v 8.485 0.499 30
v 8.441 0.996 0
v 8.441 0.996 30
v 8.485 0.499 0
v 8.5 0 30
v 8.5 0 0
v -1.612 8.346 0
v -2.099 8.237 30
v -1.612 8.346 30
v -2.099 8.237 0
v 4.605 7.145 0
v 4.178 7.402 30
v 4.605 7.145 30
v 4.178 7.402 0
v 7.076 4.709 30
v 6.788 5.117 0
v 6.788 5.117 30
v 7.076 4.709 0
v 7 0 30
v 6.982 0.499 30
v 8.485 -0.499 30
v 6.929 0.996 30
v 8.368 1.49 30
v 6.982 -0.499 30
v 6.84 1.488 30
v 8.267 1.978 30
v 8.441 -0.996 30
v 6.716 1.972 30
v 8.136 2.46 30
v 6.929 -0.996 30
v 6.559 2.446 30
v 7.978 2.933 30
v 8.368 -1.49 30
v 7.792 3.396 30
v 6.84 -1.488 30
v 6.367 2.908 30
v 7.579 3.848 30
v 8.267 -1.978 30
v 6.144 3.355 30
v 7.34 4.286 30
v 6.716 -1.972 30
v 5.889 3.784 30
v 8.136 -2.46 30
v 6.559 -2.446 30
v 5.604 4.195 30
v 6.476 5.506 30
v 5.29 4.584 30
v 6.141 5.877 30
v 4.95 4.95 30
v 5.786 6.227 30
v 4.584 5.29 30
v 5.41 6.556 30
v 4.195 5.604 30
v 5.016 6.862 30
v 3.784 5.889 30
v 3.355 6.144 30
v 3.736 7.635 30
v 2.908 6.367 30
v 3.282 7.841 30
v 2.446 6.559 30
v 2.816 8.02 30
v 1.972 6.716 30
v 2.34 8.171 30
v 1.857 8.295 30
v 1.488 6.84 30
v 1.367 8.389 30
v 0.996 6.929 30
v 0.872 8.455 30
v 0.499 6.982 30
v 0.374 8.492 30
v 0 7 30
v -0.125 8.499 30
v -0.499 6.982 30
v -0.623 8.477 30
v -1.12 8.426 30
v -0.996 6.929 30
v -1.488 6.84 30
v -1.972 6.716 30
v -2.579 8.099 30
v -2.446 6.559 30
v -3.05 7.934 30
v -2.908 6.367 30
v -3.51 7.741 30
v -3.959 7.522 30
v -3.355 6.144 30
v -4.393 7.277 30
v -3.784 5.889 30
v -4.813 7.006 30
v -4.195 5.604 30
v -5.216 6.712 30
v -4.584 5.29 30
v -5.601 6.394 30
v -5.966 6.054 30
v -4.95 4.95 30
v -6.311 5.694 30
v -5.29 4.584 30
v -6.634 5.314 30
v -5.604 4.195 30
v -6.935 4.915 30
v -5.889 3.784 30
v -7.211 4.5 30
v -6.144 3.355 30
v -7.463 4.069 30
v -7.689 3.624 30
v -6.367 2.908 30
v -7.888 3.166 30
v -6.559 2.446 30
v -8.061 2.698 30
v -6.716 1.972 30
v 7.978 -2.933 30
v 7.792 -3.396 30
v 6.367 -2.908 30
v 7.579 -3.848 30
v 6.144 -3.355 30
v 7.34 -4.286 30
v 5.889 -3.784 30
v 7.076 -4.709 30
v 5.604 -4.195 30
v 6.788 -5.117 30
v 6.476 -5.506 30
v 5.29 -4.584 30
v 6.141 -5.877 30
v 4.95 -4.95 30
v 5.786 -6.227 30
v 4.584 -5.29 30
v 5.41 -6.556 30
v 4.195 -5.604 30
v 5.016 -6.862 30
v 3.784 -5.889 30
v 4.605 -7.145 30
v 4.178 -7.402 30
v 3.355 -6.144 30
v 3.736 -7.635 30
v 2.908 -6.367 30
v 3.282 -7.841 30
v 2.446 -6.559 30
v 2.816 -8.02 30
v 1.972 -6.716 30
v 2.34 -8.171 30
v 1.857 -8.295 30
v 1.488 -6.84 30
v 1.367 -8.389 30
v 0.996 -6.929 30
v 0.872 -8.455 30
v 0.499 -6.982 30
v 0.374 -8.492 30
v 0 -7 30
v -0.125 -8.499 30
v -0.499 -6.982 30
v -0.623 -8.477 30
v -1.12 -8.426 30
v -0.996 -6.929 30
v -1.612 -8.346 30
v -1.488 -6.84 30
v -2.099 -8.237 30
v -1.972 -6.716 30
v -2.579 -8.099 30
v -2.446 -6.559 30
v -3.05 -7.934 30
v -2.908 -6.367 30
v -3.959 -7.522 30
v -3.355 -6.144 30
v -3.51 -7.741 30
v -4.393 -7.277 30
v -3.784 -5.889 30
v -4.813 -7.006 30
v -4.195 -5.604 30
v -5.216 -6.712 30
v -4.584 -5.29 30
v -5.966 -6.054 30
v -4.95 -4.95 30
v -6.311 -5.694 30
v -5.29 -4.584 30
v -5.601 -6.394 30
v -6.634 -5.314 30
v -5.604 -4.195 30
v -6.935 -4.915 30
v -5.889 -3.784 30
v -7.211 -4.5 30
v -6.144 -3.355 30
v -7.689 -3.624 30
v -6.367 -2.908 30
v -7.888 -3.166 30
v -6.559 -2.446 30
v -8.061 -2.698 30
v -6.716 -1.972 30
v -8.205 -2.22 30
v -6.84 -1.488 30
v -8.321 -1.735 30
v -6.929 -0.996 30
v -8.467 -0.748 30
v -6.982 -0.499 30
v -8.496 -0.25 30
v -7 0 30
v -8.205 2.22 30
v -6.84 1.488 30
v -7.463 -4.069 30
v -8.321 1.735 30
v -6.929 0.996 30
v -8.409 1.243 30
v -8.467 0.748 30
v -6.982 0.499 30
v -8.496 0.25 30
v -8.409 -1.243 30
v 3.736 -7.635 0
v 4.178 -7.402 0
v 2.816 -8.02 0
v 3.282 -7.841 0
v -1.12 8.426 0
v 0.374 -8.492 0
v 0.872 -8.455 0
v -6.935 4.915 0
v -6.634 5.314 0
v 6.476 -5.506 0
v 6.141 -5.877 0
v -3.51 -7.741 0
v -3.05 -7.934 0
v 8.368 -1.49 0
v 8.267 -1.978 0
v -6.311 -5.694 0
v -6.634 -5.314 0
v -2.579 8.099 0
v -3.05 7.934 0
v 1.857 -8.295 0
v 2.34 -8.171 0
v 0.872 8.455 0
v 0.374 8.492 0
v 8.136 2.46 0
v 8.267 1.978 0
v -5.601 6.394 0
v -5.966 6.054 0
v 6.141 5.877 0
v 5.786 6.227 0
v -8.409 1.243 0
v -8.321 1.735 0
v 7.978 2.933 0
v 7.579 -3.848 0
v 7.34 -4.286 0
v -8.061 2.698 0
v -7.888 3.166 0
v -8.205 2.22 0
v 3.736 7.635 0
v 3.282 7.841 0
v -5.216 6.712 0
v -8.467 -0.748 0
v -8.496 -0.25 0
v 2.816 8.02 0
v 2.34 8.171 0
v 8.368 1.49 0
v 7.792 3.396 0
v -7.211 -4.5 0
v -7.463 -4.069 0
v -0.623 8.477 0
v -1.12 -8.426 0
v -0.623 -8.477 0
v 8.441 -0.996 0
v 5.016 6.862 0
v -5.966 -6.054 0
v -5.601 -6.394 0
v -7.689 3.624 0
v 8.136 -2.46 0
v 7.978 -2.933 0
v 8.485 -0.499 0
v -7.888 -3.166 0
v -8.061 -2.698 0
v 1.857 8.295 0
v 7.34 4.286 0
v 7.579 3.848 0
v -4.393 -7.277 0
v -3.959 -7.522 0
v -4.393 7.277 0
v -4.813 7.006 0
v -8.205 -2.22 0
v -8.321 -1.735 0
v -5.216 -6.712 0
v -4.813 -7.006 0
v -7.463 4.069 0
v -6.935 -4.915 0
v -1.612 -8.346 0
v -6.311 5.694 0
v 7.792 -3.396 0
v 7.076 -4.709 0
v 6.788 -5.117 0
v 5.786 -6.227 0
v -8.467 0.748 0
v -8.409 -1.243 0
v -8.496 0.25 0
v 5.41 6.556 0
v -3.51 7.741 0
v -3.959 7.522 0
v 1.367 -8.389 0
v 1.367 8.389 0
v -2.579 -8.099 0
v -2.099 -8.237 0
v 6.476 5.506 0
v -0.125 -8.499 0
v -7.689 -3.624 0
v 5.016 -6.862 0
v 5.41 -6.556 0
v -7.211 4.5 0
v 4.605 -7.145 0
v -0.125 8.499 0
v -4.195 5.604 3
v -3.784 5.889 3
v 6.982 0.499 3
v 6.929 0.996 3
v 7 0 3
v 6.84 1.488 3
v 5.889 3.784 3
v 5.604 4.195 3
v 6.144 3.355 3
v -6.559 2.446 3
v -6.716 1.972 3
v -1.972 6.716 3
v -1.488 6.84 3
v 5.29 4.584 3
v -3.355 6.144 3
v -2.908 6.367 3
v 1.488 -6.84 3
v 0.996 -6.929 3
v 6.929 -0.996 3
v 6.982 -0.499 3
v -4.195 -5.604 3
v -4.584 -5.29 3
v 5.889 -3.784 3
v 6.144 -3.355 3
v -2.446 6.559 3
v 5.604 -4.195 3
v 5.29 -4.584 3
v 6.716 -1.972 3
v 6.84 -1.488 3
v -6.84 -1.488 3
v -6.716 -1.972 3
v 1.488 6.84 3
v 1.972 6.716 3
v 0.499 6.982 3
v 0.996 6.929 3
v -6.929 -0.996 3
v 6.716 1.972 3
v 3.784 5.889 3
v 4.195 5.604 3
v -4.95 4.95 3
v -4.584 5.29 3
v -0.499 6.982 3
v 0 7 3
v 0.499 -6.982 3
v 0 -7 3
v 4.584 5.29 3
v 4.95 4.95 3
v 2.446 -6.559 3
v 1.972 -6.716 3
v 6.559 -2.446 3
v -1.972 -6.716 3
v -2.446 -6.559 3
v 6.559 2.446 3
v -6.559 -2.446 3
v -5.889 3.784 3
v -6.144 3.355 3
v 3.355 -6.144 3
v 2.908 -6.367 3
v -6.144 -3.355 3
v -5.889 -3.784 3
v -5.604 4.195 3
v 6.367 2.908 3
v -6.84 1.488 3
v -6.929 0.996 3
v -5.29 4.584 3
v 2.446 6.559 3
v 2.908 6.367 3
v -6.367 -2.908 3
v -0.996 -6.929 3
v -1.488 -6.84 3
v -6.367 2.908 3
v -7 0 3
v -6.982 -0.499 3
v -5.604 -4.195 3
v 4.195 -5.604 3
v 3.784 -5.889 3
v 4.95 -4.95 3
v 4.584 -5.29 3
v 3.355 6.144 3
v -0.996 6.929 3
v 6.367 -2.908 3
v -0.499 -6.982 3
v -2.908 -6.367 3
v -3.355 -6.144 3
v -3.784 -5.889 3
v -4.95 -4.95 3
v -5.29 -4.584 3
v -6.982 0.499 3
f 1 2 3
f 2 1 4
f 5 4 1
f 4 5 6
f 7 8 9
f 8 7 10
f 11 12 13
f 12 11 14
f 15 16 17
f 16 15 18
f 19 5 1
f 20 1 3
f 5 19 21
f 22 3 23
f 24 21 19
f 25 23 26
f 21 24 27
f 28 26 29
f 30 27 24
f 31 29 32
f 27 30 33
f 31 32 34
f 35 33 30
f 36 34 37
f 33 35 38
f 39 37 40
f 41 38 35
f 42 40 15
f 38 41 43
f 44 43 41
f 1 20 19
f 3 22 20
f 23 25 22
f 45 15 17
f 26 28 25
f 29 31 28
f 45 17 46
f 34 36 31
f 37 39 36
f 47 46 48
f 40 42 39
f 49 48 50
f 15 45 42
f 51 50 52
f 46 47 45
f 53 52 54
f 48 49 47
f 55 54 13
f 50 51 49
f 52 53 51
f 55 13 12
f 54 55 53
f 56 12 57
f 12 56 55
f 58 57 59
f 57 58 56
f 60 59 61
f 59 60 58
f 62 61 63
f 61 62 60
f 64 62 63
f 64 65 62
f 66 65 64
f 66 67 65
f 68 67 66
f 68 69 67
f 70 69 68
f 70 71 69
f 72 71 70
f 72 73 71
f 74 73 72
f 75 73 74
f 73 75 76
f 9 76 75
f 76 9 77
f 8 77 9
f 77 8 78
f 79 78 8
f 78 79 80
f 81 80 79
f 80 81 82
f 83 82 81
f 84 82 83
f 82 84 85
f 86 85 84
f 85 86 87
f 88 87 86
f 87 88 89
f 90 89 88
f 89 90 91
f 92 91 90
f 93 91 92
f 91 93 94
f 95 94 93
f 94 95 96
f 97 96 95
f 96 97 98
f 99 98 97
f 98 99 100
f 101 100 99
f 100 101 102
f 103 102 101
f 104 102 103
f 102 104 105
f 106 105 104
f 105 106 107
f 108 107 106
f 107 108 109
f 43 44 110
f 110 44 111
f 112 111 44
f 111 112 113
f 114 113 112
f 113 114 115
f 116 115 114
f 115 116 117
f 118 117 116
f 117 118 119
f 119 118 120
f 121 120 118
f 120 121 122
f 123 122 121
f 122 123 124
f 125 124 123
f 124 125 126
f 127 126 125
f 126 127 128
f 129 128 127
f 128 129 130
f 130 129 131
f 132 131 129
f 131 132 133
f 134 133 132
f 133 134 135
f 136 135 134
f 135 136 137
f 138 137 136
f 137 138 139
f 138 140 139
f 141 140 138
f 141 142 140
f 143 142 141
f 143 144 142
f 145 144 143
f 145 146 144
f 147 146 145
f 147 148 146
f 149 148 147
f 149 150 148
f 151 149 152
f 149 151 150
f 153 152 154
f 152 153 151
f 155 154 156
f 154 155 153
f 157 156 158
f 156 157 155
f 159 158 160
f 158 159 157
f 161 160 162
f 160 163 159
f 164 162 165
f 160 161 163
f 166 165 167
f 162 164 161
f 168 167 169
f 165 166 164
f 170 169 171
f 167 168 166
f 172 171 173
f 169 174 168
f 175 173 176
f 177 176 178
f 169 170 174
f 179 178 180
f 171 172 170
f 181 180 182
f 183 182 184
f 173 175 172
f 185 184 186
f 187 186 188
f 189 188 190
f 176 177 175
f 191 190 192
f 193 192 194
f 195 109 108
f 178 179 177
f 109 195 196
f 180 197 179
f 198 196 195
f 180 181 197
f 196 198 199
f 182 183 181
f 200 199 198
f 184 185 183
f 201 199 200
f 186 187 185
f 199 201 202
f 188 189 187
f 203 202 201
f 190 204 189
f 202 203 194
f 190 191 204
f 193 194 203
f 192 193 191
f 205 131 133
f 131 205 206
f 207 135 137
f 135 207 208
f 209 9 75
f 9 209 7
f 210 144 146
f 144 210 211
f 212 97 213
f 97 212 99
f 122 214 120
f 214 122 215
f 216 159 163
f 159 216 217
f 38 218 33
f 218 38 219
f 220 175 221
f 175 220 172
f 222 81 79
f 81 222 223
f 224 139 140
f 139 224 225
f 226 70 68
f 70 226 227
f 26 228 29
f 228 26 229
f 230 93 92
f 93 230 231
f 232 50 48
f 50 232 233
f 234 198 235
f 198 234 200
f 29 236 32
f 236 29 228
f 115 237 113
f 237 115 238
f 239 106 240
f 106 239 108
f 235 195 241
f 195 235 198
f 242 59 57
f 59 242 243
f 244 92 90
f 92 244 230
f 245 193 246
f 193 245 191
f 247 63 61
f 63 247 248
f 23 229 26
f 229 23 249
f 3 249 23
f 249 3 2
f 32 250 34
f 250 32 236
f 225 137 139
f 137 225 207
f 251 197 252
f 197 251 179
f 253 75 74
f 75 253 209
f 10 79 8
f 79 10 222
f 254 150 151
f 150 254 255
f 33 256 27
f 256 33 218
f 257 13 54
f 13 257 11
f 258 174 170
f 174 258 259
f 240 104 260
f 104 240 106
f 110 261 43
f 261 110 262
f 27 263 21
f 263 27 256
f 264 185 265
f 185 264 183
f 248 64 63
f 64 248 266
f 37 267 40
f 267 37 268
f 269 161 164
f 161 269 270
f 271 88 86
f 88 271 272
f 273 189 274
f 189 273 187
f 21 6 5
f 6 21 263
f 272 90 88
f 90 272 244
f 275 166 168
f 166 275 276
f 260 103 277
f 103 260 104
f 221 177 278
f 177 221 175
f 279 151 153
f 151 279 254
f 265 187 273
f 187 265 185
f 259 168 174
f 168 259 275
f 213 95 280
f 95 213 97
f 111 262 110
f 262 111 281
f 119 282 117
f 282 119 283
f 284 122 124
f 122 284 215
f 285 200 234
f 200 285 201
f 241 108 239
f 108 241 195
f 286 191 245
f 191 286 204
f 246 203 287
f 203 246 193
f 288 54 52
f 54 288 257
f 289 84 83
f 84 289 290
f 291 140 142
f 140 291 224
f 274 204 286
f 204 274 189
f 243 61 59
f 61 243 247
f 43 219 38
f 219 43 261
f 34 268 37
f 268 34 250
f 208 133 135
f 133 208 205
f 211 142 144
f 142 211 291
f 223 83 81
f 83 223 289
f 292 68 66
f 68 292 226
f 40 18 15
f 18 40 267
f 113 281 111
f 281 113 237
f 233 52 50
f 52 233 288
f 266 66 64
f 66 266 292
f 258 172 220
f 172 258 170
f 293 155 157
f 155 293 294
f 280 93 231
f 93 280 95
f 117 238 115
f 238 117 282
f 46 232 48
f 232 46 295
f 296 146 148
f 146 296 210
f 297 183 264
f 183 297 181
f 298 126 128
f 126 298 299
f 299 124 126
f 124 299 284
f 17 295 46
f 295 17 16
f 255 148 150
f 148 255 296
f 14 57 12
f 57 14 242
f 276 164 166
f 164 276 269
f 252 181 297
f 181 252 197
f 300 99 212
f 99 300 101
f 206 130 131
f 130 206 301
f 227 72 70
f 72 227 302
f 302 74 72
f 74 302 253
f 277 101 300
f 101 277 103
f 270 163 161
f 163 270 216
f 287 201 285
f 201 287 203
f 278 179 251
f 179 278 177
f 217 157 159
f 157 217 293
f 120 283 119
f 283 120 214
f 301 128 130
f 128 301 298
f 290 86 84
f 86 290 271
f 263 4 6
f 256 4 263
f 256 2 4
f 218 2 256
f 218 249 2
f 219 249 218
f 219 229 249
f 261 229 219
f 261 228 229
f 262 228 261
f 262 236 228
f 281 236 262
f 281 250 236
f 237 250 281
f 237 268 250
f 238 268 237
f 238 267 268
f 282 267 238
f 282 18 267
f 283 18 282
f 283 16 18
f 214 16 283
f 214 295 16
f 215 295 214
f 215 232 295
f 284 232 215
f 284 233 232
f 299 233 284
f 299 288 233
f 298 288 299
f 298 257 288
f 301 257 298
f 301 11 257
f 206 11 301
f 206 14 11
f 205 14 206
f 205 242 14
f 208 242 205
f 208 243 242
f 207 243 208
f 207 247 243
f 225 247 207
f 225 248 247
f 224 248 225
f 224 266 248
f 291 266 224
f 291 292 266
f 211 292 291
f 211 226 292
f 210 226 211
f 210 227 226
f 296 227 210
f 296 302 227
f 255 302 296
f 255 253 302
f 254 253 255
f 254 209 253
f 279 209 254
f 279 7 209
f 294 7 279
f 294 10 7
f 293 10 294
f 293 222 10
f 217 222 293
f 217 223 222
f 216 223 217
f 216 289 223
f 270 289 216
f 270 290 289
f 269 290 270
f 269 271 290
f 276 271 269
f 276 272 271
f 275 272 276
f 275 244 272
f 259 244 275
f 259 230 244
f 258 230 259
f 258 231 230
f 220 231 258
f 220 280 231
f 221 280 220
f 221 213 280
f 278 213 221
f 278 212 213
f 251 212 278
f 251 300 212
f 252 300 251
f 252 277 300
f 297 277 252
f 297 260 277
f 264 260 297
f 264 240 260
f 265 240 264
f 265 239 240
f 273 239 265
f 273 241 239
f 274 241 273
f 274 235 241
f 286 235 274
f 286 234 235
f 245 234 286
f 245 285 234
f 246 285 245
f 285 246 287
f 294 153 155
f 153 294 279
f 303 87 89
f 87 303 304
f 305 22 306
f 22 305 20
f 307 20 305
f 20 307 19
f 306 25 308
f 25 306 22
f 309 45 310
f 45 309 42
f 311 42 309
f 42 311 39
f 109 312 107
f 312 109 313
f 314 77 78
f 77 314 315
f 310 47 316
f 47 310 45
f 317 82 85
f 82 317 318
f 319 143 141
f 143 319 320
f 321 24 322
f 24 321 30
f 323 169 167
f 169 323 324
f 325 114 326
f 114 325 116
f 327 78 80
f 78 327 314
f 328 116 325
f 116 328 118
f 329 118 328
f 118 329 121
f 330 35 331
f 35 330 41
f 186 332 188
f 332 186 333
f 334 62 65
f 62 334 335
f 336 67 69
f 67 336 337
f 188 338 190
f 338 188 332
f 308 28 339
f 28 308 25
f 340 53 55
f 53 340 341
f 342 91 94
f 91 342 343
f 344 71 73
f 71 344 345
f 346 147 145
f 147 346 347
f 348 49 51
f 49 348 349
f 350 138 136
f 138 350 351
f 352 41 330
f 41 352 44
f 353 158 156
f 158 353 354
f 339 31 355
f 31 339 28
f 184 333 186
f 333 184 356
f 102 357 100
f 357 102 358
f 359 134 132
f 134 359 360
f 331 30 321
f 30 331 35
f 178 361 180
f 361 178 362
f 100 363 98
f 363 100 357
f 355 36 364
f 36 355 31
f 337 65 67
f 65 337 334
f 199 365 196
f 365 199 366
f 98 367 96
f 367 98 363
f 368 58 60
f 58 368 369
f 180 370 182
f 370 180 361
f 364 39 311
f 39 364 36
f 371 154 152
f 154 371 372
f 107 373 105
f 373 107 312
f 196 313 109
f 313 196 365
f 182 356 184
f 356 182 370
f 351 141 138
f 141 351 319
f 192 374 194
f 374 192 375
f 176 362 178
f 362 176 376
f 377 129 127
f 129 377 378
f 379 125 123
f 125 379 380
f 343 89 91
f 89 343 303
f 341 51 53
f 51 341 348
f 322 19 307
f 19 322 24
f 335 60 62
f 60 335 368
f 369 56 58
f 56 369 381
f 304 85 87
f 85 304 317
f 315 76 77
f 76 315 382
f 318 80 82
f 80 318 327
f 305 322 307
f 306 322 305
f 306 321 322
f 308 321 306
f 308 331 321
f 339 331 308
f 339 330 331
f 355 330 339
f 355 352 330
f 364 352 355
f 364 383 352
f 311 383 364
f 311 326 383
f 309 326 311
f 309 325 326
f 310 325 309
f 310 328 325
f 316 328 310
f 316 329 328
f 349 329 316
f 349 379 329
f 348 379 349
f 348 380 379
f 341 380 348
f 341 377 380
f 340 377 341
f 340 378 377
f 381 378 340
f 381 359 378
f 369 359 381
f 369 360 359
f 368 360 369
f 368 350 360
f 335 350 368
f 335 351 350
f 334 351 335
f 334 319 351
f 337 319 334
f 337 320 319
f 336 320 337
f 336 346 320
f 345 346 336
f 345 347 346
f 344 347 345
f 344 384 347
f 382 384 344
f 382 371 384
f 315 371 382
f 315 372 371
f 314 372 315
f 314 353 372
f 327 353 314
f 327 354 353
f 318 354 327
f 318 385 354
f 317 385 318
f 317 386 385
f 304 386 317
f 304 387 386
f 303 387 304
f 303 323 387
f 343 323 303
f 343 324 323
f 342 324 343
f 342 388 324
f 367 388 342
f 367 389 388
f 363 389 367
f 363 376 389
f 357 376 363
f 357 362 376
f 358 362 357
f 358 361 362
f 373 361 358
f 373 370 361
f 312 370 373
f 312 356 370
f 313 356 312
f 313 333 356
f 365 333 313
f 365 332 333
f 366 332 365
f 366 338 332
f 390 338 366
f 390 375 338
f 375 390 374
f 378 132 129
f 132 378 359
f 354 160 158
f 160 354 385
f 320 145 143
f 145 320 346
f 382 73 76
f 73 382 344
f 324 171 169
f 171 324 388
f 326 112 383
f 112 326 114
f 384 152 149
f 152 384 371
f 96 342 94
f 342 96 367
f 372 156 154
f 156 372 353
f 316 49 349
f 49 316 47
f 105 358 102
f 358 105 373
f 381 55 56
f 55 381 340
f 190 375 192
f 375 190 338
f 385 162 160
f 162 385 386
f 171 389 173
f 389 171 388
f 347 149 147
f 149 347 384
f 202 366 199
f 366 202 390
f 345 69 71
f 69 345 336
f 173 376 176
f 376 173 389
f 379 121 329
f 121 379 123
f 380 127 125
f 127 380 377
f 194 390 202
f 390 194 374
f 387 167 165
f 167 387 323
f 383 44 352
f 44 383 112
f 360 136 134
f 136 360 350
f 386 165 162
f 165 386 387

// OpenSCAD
$fa=0.5;
$fs=0.5;

difference() {
    cylinder(h = 30, d = 17);

    translate([0, 0, 3])
        cylinder(h = 30, d = 14);
}
